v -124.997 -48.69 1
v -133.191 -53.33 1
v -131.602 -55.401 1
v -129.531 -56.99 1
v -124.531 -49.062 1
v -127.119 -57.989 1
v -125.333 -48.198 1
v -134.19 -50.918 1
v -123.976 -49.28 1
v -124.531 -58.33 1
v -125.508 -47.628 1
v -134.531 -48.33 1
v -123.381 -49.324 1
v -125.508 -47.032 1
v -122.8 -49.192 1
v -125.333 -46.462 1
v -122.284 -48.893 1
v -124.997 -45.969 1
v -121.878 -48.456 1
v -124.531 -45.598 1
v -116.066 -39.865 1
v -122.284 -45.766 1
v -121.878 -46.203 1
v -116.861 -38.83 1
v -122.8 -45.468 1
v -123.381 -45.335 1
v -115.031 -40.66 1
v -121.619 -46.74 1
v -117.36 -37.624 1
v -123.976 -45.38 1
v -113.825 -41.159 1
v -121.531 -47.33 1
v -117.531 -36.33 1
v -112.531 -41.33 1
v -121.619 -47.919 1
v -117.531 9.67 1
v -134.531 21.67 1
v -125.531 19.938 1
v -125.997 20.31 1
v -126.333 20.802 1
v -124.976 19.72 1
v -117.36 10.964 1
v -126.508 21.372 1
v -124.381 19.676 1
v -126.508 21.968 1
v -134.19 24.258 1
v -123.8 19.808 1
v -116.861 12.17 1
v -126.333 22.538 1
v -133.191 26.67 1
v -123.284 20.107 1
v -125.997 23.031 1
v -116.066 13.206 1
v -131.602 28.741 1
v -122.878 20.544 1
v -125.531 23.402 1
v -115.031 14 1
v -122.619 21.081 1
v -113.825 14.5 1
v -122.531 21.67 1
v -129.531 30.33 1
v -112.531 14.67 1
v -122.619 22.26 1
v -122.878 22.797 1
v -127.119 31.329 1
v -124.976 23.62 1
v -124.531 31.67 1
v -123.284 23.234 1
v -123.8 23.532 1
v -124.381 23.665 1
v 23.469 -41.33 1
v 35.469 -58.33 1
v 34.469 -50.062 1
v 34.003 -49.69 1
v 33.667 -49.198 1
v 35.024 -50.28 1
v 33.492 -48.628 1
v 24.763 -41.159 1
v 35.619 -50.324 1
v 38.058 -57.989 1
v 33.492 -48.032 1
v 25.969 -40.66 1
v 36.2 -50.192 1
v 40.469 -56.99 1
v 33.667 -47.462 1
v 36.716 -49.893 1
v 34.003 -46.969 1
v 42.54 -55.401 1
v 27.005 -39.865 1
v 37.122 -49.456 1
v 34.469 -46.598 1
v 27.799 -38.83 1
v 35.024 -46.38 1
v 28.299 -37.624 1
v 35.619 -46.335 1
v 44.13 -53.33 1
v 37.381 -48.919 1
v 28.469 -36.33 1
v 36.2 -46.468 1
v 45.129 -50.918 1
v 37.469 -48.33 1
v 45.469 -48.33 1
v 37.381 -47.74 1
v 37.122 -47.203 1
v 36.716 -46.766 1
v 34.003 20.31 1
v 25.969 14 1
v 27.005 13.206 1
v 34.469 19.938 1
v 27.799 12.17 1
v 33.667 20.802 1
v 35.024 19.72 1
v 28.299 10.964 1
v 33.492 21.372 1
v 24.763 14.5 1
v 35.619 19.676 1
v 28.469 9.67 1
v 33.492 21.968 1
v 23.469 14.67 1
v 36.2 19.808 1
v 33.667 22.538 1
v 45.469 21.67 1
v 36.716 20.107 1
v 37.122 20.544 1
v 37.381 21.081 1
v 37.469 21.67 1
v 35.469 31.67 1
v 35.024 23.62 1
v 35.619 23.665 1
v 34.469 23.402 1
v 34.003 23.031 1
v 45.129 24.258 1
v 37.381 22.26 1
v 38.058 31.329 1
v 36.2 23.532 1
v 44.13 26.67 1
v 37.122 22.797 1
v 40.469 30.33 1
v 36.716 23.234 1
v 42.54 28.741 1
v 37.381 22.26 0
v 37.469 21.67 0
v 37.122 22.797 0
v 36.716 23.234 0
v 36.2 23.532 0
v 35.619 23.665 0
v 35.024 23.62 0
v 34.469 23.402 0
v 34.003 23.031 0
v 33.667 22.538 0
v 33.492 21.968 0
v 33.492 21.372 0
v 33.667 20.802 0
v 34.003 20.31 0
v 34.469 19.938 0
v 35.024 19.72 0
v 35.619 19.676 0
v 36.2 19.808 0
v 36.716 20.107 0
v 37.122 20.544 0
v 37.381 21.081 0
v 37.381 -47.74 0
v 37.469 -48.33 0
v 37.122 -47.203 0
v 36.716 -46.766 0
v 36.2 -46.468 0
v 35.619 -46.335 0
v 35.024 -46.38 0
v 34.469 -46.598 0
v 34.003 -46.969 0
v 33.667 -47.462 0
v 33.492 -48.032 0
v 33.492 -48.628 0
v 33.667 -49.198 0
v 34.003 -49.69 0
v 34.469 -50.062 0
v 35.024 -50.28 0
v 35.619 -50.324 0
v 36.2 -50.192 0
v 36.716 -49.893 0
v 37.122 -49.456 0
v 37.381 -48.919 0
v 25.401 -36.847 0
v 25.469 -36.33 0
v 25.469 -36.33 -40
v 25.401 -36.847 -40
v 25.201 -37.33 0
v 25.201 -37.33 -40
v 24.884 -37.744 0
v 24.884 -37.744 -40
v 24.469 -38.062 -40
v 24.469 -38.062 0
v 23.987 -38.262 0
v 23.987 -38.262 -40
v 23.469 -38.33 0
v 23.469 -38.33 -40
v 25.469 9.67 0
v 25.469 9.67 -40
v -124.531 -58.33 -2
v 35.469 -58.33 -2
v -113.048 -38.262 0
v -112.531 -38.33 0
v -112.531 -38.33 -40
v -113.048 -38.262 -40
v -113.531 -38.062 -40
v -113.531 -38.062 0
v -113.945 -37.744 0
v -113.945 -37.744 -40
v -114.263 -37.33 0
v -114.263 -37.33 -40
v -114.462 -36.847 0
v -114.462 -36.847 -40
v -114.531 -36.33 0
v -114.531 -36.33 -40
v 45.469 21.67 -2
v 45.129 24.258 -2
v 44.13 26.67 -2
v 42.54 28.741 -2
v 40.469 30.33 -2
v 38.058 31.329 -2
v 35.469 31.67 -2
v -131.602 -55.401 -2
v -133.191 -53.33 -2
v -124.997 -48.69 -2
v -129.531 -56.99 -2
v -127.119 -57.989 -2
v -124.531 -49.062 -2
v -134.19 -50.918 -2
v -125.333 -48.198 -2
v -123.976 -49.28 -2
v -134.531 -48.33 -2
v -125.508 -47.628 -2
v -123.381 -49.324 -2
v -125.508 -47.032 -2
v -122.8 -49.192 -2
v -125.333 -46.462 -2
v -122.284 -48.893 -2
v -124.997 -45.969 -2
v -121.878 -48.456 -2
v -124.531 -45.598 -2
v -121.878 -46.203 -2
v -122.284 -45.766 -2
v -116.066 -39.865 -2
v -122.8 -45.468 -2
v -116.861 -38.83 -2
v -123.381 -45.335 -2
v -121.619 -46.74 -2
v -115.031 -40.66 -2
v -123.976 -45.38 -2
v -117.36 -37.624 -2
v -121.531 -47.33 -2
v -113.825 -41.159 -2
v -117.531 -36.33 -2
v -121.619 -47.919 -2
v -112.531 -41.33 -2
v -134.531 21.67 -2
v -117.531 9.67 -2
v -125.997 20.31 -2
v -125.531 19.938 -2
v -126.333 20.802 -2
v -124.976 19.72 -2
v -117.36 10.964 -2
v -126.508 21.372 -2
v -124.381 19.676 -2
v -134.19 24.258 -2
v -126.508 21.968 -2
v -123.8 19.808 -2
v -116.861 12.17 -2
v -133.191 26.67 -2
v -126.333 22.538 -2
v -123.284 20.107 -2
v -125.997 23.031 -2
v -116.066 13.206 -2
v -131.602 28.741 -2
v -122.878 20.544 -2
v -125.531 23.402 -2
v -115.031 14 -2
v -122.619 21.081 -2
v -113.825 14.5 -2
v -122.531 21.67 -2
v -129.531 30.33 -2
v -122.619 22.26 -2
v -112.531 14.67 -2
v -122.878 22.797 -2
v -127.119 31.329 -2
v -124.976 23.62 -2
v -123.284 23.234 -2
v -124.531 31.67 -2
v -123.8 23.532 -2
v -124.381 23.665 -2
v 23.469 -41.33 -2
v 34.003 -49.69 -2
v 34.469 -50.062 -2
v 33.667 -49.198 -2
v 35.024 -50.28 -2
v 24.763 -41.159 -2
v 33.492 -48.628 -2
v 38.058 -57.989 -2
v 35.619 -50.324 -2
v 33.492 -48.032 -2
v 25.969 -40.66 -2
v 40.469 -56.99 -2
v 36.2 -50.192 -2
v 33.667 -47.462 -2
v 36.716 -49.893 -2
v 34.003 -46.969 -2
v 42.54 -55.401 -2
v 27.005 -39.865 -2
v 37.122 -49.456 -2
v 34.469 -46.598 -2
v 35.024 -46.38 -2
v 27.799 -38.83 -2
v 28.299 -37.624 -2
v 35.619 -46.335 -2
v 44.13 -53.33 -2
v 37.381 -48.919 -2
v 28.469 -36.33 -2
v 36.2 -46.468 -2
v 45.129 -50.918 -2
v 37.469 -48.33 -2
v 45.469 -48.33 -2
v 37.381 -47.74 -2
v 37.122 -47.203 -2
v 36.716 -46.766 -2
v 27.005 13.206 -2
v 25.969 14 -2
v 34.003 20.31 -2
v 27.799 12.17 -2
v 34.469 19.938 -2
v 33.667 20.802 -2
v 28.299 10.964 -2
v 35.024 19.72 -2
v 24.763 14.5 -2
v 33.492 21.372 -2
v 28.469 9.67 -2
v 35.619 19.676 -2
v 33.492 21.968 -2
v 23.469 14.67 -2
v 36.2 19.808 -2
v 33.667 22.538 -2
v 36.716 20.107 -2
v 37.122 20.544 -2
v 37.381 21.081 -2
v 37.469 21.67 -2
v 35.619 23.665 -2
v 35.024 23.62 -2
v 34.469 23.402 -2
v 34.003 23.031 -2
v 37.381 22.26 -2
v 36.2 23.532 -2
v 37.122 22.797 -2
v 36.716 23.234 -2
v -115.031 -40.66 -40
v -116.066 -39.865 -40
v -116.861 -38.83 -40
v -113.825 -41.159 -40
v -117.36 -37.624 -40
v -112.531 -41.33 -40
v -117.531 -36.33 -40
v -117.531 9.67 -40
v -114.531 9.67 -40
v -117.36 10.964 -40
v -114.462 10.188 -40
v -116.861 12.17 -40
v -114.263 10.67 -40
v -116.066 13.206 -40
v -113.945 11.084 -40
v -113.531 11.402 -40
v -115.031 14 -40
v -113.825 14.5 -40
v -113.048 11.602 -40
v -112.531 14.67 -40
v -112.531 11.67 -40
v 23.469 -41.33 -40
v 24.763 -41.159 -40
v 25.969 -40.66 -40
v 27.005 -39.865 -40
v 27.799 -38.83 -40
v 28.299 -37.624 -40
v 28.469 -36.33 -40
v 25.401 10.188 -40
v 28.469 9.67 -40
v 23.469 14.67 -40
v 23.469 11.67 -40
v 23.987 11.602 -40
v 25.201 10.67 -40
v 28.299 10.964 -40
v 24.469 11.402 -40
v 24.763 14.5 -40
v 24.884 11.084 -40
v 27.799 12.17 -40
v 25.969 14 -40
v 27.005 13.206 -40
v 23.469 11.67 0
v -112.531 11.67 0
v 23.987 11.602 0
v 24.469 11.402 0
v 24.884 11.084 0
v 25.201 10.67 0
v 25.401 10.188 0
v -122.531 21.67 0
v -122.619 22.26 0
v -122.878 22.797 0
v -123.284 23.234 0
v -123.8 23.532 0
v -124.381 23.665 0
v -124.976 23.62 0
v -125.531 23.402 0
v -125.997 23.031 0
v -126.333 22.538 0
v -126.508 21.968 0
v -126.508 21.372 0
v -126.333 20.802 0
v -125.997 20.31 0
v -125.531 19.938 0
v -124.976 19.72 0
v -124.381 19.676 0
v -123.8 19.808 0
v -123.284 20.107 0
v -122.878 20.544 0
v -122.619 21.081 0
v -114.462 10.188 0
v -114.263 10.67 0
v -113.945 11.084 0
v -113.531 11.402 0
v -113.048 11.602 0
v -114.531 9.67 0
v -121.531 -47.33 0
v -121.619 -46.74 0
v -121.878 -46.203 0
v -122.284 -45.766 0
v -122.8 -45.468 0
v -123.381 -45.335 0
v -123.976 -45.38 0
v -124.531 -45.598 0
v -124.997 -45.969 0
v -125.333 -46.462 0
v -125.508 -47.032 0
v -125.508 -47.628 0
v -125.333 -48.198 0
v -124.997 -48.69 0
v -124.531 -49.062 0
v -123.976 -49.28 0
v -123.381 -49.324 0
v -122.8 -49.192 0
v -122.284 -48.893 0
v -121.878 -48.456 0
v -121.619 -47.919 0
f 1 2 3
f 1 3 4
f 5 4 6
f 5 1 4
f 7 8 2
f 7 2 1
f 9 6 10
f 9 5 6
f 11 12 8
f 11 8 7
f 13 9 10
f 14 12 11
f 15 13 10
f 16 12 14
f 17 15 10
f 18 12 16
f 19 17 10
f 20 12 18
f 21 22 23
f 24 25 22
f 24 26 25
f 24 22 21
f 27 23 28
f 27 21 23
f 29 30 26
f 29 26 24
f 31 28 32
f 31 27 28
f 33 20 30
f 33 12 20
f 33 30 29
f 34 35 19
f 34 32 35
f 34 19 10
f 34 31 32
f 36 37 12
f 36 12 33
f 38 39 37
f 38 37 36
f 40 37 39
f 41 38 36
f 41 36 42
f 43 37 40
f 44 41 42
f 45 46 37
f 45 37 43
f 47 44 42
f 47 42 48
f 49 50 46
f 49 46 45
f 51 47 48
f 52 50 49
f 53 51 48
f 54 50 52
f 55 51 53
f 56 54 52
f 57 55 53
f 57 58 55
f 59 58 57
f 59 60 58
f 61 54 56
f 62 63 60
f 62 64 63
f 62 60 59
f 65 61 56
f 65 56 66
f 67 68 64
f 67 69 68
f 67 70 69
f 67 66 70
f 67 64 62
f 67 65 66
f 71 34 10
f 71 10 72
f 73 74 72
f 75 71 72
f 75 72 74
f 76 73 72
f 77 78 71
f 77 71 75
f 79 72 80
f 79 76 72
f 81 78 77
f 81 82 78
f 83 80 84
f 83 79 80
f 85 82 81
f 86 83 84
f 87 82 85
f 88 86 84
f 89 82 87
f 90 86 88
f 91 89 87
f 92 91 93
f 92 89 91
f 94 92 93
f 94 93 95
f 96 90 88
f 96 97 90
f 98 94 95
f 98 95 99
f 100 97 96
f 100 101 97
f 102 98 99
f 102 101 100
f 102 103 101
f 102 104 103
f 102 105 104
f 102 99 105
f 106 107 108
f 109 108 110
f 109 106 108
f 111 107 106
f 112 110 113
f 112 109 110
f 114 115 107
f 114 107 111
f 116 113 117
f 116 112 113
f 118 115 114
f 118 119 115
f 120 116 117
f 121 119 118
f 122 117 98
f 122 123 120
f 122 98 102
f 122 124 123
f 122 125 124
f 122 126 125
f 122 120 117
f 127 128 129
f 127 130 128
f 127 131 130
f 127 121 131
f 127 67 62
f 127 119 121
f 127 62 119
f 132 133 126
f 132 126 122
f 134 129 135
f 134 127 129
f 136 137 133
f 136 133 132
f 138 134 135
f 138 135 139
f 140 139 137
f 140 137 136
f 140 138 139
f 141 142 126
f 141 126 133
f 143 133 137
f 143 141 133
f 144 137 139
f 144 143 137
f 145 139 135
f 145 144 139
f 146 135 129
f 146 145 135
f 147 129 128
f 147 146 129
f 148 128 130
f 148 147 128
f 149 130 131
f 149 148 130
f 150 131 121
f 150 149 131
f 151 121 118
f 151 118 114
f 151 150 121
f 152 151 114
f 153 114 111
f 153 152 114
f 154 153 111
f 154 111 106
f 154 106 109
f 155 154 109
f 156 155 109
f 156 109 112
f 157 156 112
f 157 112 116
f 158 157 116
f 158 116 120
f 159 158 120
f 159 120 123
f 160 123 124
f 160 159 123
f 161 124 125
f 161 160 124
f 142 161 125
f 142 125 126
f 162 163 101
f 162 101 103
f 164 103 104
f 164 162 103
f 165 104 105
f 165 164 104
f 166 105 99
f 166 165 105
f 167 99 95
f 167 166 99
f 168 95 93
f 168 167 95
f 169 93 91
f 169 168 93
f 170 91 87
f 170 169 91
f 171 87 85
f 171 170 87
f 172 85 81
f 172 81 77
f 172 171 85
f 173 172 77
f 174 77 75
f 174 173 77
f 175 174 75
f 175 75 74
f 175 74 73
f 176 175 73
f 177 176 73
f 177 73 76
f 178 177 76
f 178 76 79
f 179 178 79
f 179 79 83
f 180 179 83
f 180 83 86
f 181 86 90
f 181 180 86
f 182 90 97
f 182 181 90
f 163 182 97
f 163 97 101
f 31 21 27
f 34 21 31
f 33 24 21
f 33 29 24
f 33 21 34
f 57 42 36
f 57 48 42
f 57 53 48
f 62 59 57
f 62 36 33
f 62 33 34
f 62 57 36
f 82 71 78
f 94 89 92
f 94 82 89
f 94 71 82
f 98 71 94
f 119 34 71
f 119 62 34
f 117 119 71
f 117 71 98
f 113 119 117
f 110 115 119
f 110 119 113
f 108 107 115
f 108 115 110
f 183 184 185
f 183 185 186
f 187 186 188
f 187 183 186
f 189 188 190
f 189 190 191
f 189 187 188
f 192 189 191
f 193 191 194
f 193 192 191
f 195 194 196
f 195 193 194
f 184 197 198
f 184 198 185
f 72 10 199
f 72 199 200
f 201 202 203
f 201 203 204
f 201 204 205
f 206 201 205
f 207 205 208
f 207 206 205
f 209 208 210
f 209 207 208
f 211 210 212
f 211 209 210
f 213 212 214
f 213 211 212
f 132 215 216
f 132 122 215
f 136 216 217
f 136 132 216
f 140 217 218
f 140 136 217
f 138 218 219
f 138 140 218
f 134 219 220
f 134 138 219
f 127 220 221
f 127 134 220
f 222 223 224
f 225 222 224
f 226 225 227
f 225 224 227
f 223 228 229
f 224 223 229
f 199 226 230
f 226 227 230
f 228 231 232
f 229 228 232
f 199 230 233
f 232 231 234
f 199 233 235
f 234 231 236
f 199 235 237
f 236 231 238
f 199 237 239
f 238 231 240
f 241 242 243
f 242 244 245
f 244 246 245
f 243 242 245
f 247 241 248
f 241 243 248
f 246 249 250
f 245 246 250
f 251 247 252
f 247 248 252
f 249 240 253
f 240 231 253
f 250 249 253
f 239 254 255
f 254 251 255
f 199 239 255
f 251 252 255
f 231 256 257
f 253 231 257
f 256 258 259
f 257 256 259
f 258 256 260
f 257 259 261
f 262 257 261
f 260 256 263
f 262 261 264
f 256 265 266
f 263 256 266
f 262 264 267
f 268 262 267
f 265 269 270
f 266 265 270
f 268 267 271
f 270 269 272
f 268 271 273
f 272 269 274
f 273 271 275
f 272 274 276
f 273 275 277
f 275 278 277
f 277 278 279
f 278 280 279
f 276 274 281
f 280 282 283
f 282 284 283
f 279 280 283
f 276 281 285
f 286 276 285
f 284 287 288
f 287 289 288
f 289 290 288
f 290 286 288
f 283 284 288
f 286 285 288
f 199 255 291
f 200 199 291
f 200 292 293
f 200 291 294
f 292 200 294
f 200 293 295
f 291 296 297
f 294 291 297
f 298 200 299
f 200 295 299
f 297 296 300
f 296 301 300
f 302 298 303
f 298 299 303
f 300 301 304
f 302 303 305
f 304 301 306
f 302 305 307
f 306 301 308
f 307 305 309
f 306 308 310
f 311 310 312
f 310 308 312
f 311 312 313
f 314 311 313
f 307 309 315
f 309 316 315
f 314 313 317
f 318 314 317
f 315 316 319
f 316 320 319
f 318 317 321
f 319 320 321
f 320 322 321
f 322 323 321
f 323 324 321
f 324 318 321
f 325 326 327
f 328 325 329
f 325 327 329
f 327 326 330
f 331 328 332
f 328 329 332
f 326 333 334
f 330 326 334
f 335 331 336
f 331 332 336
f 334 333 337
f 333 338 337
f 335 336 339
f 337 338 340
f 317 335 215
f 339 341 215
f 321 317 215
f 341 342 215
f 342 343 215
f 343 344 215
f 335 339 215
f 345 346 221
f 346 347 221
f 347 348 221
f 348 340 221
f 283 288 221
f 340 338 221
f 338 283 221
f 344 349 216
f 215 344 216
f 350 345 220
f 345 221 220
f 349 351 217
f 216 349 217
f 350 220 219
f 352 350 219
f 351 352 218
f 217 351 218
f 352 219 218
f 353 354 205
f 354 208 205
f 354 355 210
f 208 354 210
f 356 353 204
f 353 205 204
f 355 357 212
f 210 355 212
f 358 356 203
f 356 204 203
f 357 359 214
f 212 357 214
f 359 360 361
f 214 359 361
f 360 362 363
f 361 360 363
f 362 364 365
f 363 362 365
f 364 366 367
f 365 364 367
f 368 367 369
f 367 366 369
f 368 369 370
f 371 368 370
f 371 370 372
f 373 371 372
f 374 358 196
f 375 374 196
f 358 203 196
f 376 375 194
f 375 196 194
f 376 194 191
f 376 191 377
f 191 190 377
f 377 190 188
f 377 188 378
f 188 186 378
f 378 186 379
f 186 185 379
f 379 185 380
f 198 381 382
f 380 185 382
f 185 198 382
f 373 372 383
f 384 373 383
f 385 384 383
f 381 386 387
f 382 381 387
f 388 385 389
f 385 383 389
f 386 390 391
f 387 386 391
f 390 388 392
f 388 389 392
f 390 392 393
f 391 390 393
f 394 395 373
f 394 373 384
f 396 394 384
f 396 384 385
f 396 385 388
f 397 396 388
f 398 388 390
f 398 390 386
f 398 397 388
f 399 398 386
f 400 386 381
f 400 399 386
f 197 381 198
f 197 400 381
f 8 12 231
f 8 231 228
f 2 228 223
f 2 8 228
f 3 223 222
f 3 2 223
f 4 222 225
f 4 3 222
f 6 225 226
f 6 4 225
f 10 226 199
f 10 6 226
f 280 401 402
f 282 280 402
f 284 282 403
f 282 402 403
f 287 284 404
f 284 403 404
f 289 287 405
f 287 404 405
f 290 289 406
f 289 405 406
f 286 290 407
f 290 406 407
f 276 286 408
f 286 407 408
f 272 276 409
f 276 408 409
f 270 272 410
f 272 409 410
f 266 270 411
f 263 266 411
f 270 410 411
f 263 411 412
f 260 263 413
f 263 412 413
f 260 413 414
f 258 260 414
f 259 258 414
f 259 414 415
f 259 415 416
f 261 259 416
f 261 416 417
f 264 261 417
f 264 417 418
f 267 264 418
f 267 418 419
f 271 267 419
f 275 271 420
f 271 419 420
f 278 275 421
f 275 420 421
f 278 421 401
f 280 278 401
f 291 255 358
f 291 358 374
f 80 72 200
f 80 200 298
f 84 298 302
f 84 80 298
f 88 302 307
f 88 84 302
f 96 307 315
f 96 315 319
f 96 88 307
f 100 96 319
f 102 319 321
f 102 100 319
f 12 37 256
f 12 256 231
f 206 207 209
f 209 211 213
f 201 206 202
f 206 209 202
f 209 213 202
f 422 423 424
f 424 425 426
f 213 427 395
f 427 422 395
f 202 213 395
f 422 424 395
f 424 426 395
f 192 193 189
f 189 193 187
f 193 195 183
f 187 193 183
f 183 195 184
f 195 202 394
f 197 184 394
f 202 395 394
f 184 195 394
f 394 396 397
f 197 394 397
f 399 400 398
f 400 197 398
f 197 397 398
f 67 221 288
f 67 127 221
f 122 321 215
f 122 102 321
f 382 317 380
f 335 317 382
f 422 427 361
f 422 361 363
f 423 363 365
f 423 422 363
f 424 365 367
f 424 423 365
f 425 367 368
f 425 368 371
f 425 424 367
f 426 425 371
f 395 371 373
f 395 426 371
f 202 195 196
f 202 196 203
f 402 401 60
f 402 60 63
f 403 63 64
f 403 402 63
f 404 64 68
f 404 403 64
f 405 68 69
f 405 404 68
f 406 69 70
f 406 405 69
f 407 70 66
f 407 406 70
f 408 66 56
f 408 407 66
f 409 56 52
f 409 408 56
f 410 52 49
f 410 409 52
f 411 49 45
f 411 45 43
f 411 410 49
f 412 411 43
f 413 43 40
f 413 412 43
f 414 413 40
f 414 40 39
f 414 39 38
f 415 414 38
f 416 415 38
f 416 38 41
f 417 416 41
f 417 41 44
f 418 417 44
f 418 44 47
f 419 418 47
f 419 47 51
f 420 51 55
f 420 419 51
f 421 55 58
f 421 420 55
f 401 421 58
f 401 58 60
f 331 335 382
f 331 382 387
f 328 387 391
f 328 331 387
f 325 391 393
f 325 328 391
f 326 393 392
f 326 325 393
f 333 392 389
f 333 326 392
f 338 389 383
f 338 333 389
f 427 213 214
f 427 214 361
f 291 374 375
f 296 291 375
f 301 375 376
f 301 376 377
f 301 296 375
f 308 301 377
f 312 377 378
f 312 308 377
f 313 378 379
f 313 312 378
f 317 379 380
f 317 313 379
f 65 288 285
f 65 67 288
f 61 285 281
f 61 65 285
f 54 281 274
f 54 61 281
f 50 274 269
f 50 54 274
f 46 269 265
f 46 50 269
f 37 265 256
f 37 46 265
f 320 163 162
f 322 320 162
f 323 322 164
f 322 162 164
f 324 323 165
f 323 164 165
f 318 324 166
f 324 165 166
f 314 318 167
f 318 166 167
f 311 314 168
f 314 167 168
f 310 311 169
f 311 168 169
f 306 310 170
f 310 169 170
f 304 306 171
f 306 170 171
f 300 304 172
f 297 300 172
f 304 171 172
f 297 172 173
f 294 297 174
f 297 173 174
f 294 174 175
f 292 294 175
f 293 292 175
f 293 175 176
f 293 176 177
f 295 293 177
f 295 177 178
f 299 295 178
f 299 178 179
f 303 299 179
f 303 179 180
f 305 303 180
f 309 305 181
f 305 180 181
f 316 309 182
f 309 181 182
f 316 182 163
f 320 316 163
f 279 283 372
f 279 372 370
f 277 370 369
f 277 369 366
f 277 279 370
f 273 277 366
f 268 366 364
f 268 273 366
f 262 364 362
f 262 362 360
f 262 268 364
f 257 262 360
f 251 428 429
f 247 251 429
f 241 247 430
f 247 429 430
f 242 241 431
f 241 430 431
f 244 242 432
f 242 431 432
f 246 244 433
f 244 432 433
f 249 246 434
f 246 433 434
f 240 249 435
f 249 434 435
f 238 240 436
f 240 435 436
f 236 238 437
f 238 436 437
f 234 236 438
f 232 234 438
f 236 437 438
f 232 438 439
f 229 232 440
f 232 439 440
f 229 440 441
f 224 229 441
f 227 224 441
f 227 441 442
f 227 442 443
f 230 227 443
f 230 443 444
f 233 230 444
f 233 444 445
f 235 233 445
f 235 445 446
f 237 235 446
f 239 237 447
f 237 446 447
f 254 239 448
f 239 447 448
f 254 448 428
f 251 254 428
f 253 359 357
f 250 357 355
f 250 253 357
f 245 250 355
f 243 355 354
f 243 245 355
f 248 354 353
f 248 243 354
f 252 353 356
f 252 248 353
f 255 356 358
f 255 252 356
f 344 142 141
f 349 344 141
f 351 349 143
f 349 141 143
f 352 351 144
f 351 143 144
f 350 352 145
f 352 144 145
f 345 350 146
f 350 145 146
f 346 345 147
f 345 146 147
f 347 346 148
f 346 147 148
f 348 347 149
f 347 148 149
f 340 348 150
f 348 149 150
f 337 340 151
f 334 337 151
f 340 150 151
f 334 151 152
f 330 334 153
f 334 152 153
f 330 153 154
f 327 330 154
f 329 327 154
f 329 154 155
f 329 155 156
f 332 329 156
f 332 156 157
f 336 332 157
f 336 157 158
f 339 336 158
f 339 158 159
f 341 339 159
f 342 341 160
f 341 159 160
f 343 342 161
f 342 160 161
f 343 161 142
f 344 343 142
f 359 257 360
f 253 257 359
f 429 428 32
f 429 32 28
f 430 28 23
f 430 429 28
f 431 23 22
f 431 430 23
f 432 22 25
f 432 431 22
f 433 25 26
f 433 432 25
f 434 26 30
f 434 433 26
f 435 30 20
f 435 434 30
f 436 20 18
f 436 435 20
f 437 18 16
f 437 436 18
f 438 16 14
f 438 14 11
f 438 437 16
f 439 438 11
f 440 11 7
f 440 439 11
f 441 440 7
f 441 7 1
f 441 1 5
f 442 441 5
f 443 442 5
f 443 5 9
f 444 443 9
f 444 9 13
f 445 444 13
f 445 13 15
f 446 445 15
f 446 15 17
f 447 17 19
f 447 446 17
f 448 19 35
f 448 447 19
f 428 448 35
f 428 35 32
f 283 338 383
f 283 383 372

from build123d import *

# Parameters (mm, degrees)
F1_DEPTH = 40
F0_R     = 2
F2_DEPTH = 1
F3_DEPTH = 2
F4_DEPTH = 1


with BuildPart() as f1:
    # F0 (on Top) → F1 (new body)
    with BuildSketch(Plane.XY):
        with BuildLine():
            Line((23.4693709612, 14.670217514), (-112.5306290388, 14.670217514))
            ThreePointArc((-112.5306290388, 14.670217514), (-116.0661629447, 13.20575142), (-117.5306290388, 9.670217514))
            Line((-117.5306290388, 9.670217514), (-117.5306290388, -36.329782486))
            ThreePointArc((-117.5306290388, -36.329782486), (-116.0661629447, -39.8653163919), (-112.5306290388, -41.329782486))
            Line((-112.5306290388, -41.329782486), (23.4693709612, -41.329782486))
            ThreePointArc((23.4693709612, -41.329782486), (27.0049048671, -39.8653163919), (28.4693709612, -36.329782486))
            Line((28.4693709612, -36.329782486), (28.4693709612, 9.670217514))
            ThreePointArc((28.4693709612, 9.670217514), (27.0049048671, 13.20575142), (23.4693709612, 14.670217514))
        make_face()
        with BuildLine():
            ThreePointArc((-114.5306290388, 9.670217514), (-113.9448426012, 11.0844310764), (-112.5306290388, 11.670217514))
            Line((-112.5306290388, 11.670217514), (23.4693709612, 11.670217514))
            ThreePointArc((23.4693709612, 11.670217514), (24.8835845236, 11.0844310764), (25.4693709612, 9.670217514))
            Line((25.4693709612, 9.670217514), (25.4693709612, -36.329782486))
            ThreePointArc((25.4693709612, -36.329782486), (24.8835845236, -37.7439960483), (23.4693709612, -38.329782486))
            Line((23.4693709612, -38.329782486), (-112.5306290388, -38.329782486))
            ThreePointArc((-112.5306290388, -38.329782486), (-113.9448426012, -37.7439960483), (-114.5306290388, -36.329782486))
            Line((-114.5306290388, -36.329782486), (-114.5306290388, 9.670217514))
        make_face(mode=Mode.SUBTRACT)
    extrude(amount=-F1_DEPTH)



with BuildPart() as f2:
    # F0 (on Top) → F2 (new body)
    with BuildSketch(Plane.XY):
        with BuildLine():
            ThreePointArc((-124.5306290388, 31.670217514), (-131.6016968507, 28.7412853259), (-134.5306290388, 21.670217514))
            Line((-134.5306290388, 21.670217514), (-134.5306290388, -48.329782486))
            ThreePointArc((-134.5306290388, -48.329782486), (-131.6016968507, -55.4008502978), (-124.5306290388, -58.329782486))
            Line((-124.5306290388, -58.329782486), (35.4693709612, -58.329782486))
            ThreePointArc((35.4693709612, -58.329782486), (42.5404387731, -55.4008502978), (45.4693709612, -48.329782486))
            Line((45.4693709612, -48.329782486), (45.4693709612, 21.670217514))
            ThreePointArc((45.4693709612, 21.670217514), (42.5404387731, 28.7412853259), (35.4693709612, 31.670217514))
            Line((35.4693709612, 31.670217514), (-124.5306290388, 31.670217514))
        make_face()
        with Locations((-123.5306290388, -47.329782486)):
            Circle(F0_R, mode=Mode.SUBTRACT)
        with Locations((35.4693709612, -48.329782486)):
            Circle(F0_R, mode=Mode.SUBTRACT)
        with Locations((-124.5306290388, 21.670217514)):
            Circle(F0_R, mode=Mode.SUBTRACT)
        with BuildLine():
            ThreePointArc((-117.5306290388, 9.670217514), (-116.0661629447, 13.20575142), (-112.5306290388, 14.670217514))
            Line((-112.5306290388, 14.670217514), (23.4693709612, 14.670217514))
            ThreePointArc((23.4693709612, 14.670217514), (27.0049048671, 13.20575142), (28.4693709612, 9.670217514))
            Line((28.4693709612, 9.670217514), (28.4693709612, -36.329782486))
            ThreePointArc((28.4693709612, -36.329782486), (27.0049048671, -39.8653163919), (23.4693709612, -41.329782486))
            Line((23.4693709612, -41.329782486), (-112.5306290388, -41.329782486))
            ThreePointArc((-112.5306290388, -41.329782486), (-116.0661629447, -39.8653163919), (-117.5306290388, -36.329782486))
            Line((-117.5306290388, -36.329782486), (-117.5306290388, 9.670217514))
        make_face(mode=Mode.SUBTRACT)
        with Locations((35.4693709612, 21.670217514)):
            Circle(F0_R, mode=Mode.SUBTRACT)
    extrude(amount=F2_DEPTH)


with BuildPart() as f1_1:
    add(f1.part)

    add(f2.part)  # F3 merges F2
    # F0 (on Top) → F3 (join)
    with BuildSketch(Plane.XY):
        with BuildLine():
            ThreePointArc((-124.5306290388, 31.670217514), (-131.6016968507, 28.7412853259), (-134.5306290388, 21.670217514))
            Line((-134.5306290388, 21.670217514), (-134.5306290388, -48.329782486))
            ThreePointArc((-134.5306290388, -48.329782486), (-131.6016968507, -55.4008502978), (-124.5306290388, -58.329782486))
            Line((-124.5306290388, -58.329782486), (35.4693709612, -58.329782486))
            ThreePointArc((35.4693709612, -58.329782486), (42.5404387731, -55.4008502978), (45.4693709612, -48.329782486))
            Line((45.4693709612, -48.329782486), (45.4693709612, 21.670217514))
            ThreePointArc((45.4693709612, 21.670217514), (42.5404387731, 28.7412853259), (35.4693709612, 31.670217514))
            Line((35.4693709612, 31.670217514), (-124.5306290388, 31.670217514))
        make_face()
        with Locations((-123.5306290388, -47.329782486)):
            Circle(F0_R, mode=Mode.SUBTRACT)
        with Locations((35.4693709612, -48.329782486)):
            Circle(F0_R, mode=Mode.SUBTRACT)
        with Locations((-124.5306290388, 21.670217514)):
            Circle(F0_R, mode=Mode.SUBTRACT)
        with BuildLine():
            ThreePointArc((-117.5306290388, 9.670217514), (-116.0661629447, 13.20575142), (-112.5306290388, 14.670217514))
            Line((-112.5306290388, 14.670217514), (23.4693709612, 14.670217514))
            ThreePointArc((23.4693709612, 14.670217514), (27.0049048671, 13.20575142), (28.4693709612, 9.670217514))
            Line((28.4693709612, 9.670217514), (28.4693709612, -36.329782486))
            ThreePointArc((28.4693709612, -36.329782486), (27.0049048671, -39.8653163919), (23.4693709612, -41.329782486))
            Line((23.4693709612, -41.329782486), (-112.5306290388, -41.329782486))
            ThreePointArc((-112.5306290388, -41.329782486), (-116.0661629447, -39.8653163919), (-117.5306290388, -36.329782486))
            Line((-117.5306290388, -36.329782486), (-117.5306290388, 9.670217514))
        make_face(mode=Mode.SUBTRACT)
        with Locations((35.4693709612, 21.670217514)):
            Circle(F0_R, mode=Mode.SUBTRACT)
    extrude(amount=-F3_DEPTH)

    # F0 (on Top) → F4 (join)
    with BuildSketch(Plane.XY):
        with BuildLine():
            Line((23.4693709612, 14.670217514), (-112.5306290388, 14.670217514))
            ThreePointArc((-112.5306290388, 14.670217514), (-116.0661629447, 13.20575142), (-117.5306290388, 9.670217514))
            Line((-117.5306290388, 9.670217514), (-117.5306290388, -36.329782486))
            ThreePointArc((-117.5306290388, -36.329782486), (-116.0661629447, -39.8653163919), (-112.5306290388, -41.329782486))
            Line((-112.5306290388, -41.329782486), (23.4693709612, -41.329782486))
            ThreePointArc((23.4693709612, -41.329782486), (27.0049048671, -39.8653163919), (28.4693709612, -36.329782486))
            Line((28.4693709612, -36.329782486), (28.4693709612, 9.670217514))
            ThreePointArc((28.4693709612, 9.670217514), (27.0049048671, 13.20575142), (23.4693709612, 14.670217514))
        make_face()
        with BuildLine():
            ThreePointArc((-114.5306290388, 9.670217514), (-113.9448426012, 11.0844310764), (-112.5306290388, 11.670217514))
            Line((-112.5306290388, 11.670217514), (23.4693709612, 11.670217514))
            ThreePointArc((23.4693709612, 11.670217514), (24.8835845236, 11.0844310764), (25.4693709612, 9.670217514))
            Line((25.4693709612, 9.670217514), (25.4693709612, -36.329782486))
            ThreePointArc((25.4693709612, -36.329782486), (24.8835845236, -37.7439960483), (23.4693709612, -38.329782486))
            Line((23.4693709612, -38.329782486), (-112.5306290388, -38.329782486))
            ThreePointArc((-112.5306290388, -38.329782486), (-113.9448426012, -37.7439960483), (-114.5306290388, -36.329782486))
            Line((-114.5306290388, -36.329782486), (-114.5306290388, 9.670217514))
        make_face(mode=Mode.SUBTRACT)
        with BuildLine():
            Line((23.4693709612, 11.670217514), (-112.5306290388, 11.670217514))
            ThreePointArc((-112.5306290388, 11.670217514), (-113.9448426012, 11.0844310764), (-114.5306290388, 9.670217514))
            Line((-114.5306290388, 9.670217514), (-114.5306290388, -36.329782486))
            ThreePointArc((-114.5306290388, -36.329782486), (-113.9448426012, -37.7439960483), (-112.5306290388, -38.329782486))
            Line((-112.5306290388, -38.329782486), (23.4693709612, -38.329782486))
            ThreePointArc((23.4693709612, -38.329782486), (24.8835845236, -37.7439960483), (25.4693709612, -36.329782486))
            Line((25.4693709612, -36.329782486), (25.4693709612, 9.670217514))
            ThreePointArc((25.4693709612, 9.670217514), (24.8835845236, 11.0844310764), (23.4693709612, 11.670217514))
        make_face()
    extrude(amount=F4_DEPTH)


solid = f1_1.part
